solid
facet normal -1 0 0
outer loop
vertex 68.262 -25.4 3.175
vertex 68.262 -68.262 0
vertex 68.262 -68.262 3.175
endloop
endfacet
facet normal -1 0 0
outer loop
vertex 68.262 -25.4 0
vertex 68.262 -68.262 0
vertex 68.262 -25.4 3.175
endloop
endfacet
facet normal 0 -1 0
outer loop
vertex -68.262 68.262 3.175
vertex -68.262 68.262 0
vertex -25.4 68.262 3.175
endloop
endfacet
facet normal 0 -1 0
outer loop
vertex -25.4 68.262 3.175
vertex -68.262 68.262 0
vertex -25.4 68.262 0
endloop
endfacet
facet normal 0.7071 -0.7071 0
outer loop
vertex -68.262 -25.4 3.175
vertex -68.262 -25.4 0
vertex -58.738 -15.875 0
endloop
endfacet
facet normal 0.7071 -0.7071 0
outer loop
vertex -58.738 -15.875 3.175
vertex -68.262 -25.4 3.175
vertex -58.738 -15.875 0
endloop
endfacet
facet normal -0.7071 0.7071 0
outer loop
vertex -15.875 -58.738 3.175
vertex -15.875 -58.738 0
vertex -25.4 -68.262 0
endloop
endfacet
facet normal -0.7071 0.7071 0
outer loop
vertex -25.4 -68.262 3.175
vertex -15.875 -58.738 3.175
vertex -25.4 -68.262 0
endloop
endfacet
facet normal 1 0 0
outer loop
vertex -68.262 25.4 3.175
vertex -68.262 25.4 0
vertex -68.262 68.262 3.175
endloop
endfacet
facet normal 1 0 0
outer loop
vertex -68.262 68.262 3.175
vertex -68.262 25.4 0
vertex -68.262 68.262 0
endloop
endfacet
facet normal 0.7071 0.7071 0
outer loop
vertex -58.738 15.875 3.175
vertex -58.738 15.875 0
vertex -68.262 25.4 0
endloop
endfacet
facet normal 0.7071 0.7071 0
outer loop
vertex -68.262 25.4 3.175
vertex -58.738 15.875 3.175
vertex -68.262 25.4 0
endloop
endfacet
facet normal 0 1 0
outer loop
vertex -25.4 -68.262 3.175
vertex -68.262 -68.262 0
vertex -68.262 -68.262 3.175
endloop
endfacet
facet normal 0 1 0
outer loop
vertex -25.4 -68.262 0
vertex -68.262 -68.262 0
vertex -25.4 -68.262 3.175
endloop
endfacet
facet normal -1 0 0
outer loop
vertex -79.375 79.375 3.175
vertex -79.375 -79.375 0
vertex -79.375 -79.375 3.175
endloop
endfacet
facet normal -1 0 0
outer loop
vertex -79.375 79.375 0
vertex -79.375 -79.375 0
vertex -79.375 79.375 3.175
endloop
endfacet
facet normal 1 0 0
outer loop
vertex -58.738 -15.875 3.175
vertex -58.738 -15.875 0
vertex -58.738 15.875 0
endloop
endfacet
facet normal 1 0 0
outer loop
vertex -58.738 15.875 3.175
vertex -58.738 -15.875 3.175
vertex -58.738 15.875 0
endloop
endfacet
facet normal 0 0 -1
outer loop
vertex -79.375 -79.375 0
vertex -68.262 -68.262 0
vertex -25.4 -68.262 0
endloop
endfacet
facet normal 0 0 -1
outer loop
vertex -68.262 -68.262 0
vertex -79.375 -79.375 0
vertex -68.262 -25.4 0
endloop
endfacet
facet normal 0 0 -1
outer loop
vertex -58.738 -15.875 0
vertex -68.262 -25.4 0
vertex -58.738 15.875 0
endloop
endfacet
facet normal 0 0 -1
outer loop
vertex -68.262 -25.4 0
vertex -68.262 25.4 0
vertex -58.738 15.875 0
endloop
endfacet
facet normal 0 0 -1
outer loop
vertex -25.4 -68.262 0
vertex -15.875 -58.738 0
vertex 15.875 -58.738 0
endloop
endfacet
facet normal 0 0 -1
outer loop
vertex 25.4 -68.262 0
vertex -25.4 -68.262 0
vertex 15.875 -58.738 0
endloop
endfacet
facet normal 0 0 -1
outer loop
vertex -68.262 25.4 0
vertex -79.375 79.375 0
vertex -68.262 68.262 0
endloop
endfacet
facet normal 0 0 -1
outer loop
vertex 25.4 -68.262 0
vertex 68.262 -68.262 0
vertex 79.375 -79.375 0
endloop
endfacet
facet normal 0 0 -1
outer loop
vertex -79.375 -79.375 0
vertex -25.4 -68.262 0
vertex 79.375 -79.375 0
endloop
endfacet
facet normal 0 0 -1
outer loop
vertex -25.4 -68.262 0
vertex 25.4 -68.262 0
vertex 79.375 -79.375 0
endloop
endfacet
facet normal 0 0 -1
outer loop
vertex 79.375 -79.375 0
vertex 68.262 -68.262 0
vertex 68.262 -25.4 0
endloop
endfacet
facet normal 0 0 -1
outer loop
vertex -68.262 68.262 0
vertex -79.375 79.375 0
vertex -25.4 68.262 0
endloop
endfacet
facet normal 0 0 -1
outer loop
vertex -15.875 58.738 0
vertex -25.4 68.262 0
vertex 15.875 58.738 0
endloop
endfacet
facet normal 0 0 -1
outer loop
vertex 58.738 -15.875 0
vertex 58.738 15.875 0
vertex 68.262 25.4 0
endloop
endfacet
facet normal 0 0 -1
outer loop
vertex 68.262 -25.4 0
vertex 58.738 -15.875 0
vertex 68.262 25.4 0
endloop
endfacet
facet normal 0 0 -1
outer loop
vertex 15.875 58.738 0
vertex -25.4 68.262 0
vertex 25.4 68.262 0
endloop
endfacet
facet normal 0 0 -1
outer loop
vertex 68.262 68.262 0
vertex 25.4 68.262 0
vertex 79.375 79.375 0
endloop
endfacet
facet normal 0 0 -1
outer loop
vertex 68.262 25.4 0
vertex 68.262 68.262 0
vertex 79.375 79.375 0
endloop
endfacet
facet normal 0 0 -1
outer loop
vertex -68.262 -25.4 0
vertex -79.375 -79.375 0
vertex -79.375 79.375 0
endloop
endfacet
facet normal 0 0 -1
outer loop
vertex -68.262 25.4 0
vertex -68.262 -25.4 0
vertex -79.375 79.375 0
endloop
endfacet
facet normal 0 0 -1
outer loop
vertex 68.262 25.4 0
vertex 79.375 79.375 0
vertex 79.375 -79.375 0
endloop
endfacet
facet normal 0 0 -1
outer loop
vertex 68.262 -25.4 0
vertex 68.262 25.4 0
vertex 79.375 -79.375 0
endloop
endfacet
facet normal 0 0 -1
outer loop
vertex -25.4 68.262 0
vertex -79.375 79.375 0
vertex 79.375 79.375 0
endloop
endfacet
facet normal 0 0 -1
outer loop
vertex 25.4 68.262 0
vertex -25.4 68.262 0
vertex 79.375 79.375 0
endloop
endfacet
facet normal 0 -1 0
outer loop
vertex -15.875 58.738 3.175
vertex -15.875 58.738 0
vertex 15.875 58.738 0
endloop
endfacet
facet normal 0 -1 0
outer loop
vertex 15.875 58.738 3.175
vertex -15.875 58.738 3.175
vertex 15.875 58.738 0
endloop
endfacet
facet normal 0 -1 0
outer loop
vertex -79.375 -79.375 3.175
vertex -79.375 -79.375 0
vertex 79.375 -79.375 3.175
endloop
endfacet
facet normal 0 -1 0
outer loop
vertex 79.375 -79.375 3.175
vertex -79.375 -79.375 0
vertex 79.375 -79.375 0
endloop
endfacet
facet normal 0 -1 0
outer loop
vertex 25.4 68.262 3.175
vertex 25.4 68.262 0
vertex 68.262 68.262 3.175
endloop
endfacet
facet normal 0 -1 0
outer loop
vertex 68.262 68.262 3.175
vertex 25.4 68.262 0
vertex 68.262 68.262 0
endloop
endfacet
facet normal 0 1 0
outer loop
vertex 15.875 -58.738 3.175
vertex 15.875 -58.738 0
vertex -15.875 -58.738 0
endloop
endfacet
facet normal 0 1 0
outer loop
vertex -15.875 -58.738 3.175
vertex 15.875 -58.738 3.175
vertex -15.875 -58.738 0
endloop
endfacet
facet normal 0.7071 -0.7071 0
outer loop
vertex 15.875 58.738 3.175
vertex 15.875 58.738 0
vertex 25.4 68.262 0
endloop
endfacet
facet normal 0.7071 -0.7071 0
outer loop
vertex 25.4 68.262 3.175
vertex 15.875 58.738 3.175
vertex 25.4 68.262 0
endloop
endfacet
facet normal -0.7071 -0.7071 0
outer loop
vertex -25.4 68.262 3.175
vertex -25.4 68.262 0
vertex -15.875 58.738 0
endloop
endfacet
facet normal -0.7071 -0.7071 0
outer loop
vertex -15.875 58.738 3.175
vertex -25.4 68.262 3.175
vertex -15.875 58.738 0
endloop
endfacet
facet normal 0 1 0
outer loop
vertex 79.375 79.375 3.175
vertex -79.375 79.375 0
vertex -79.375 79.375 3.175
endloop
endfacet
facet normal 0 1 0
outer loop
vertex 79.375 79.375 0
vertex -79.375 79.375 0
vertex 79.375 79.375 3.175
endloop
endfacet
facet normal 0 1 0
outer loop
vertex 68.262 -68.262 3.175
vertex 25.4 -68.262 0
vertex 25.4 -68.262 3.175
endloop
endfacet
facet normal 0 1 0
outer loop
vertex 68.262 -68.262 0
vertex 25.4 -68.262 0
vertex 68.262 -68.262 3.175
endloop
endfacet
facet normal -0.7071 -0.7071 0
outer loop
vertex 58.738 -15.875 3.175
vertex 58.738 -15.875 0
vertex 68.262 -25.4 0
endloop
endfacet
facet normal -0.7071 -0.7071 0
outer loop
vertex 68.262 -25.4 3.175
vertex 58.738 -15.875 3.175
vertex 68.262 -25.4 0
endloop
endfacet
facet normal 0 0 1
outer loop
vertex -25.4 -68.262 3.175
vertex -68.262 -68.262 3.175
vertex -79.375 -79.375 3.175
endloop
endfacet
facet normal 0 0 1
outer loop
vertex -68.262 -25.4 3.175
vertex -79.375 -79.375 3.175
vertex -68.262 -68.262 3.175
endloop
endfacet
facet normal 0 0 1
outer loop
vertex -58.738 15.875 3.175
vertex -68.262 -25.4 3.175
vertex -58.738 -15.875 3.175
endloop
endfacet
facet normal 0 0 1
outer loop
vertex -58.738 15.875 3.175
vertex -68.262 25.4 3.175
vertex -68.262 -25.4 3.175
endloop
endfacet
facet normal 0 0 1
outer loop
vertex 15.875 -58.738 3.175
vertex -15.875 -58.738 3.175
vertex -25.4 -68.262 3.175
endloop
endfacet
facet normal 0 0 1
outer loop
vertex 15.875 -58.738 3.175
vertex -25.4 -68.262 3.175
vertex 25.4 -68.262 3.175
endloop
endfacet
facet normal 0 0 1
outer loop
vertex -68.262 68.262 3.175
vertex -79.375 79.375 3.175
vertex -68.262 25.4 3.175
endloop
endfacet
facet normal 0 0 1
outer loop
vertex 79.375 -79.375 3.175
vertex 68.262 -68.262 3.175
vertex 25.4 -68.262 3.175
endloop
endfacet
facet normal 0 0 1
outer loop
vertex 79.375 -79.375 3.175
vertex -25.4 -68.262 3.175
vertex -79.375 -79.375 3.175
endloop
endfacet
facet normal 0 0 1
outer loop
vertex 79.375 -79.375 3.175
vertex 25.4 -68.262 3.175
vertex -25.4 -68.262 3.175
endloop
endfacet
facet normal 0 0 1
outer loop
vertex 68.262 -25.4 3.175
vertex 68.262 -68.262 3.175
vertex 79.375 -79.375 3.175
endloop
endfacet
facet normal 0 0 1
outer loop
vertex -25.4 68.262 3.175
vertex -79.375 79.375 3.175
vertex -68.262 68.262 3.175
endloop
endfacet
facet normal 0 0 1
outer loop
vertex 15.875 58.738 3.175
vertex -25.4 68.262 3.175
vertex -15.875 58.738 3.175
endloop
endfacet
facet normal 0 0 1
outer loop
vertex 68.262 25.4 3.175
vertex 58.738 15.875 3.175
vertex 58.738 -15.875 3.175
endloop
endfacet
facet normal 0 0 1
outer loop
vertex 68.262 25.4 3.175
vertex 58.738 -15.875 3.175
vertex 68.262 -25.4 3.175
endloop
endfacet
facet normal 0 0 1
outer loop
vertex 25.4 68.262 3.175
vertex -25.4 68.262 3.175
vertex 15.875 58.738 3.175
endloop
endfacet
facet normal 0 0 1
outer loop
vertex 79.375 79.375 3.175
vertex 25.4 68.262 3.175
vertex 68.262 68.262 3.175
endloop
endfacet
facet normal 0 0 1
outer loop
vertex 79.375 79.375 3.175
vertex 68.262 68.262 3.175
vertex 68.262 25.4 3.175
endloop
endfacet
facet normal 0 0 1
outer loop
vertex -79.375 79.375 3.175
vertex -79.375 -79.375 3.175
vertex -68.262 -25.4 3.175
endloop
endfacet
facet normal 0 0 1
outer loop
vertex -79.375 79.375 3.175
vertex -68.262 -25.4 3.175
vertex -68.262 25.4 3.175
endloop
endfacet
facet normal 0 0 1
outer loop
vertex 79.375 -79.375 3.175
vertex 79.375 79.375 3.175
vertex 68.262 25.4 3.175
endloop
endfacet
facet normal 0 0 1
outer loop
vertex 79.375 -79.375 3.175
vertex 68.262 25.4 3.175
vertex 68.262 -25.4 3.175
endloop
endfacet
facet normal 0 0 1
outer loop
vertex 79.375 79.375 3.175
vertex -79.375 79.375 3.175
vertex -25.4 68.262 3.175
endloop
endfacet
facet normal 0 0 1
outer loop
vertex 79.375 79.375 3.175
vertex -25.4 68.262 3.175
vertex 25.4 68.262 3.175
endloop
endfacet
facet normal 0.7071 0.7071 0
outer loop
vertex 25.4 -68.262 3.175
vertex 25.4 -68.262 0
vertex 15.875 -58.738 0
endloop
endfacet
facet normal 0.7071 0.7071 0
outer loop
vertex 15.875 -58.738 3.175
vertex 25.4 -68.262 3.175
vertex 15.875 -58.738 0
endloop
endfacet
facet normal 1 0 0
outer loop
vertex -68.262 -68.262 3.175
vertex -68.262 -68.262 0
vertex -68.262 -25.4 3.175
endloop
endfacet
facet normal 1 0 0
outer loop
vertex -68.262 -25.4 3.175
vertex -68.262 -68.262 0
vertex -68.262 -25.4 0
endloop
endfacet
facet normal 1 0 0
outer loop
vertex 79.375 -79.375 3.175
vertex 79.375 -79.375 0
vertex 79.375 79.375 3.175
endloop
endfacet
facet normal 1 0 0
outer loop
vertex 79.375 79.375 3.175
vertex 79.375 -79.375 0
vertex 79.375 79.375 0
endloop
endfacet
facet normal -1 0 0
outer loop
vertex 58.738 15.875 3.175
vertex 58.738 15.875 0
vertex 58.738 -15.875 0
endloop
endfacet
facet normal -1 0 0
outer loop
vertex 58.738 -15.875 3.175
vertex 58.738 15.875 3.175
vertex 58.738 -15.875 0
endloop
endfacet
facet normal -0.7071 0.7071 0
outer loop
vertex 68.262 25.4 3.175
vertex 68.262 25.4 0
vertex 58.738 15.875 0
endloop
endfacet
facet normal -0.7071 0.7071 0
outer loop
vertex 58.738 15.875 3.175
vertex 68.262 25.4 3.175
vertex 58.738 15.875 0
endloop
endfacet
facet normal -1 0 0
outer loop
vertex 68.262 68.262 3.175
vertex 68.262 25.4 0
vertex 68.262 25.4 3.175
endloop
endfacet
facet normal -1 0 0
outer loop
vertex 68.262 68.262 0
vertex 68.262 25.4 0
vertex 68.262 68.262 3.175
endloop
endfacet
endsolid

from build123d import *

# Parameters (mm, degrees)
SKETCH1_W           = 158.75
SKETCH1_H           = 158.75
SKETCH1_W_2         = 136.525
SKETCH1_H_2         = 136.525
BOSS_EXTRUDE1_DEPTH = 3.175


with BuildPart() as part:
    # Sketch1 → Boss-Extrude1 (new body)
    with BuildSketch(Plane.XY):
        Rectangle(SKETCH1_W, SKETCH1_H)
        Rectangle(SKETCH1_W_2, SKETCH1_H_2, mode=Mode.SUBTRACT)
        Polygon((25.4, 68.2625), (-25.4, 68.2625), (-15.875, 58.7375), (15.875, 58.7375), align=None)
        Polygon((68.2625, -25.4), (68.2625, 25.4), (58.7375, 15.875), (58.7375, -15.875), align=None)
        Polygon((-15.875, -58.7375), (-25.4, -68.2625), (25.4, -68.2625), (15.875, -58.7375), align=None)
        Polygon((-58.7375, 15.875), (-68.2625, 25.4), (-68.2625, -25.4), (-58.7375, -15.875), align=None)
    extrude(amount=BOSS_EXTRUDE1_DEPTH)


solid = part.part
